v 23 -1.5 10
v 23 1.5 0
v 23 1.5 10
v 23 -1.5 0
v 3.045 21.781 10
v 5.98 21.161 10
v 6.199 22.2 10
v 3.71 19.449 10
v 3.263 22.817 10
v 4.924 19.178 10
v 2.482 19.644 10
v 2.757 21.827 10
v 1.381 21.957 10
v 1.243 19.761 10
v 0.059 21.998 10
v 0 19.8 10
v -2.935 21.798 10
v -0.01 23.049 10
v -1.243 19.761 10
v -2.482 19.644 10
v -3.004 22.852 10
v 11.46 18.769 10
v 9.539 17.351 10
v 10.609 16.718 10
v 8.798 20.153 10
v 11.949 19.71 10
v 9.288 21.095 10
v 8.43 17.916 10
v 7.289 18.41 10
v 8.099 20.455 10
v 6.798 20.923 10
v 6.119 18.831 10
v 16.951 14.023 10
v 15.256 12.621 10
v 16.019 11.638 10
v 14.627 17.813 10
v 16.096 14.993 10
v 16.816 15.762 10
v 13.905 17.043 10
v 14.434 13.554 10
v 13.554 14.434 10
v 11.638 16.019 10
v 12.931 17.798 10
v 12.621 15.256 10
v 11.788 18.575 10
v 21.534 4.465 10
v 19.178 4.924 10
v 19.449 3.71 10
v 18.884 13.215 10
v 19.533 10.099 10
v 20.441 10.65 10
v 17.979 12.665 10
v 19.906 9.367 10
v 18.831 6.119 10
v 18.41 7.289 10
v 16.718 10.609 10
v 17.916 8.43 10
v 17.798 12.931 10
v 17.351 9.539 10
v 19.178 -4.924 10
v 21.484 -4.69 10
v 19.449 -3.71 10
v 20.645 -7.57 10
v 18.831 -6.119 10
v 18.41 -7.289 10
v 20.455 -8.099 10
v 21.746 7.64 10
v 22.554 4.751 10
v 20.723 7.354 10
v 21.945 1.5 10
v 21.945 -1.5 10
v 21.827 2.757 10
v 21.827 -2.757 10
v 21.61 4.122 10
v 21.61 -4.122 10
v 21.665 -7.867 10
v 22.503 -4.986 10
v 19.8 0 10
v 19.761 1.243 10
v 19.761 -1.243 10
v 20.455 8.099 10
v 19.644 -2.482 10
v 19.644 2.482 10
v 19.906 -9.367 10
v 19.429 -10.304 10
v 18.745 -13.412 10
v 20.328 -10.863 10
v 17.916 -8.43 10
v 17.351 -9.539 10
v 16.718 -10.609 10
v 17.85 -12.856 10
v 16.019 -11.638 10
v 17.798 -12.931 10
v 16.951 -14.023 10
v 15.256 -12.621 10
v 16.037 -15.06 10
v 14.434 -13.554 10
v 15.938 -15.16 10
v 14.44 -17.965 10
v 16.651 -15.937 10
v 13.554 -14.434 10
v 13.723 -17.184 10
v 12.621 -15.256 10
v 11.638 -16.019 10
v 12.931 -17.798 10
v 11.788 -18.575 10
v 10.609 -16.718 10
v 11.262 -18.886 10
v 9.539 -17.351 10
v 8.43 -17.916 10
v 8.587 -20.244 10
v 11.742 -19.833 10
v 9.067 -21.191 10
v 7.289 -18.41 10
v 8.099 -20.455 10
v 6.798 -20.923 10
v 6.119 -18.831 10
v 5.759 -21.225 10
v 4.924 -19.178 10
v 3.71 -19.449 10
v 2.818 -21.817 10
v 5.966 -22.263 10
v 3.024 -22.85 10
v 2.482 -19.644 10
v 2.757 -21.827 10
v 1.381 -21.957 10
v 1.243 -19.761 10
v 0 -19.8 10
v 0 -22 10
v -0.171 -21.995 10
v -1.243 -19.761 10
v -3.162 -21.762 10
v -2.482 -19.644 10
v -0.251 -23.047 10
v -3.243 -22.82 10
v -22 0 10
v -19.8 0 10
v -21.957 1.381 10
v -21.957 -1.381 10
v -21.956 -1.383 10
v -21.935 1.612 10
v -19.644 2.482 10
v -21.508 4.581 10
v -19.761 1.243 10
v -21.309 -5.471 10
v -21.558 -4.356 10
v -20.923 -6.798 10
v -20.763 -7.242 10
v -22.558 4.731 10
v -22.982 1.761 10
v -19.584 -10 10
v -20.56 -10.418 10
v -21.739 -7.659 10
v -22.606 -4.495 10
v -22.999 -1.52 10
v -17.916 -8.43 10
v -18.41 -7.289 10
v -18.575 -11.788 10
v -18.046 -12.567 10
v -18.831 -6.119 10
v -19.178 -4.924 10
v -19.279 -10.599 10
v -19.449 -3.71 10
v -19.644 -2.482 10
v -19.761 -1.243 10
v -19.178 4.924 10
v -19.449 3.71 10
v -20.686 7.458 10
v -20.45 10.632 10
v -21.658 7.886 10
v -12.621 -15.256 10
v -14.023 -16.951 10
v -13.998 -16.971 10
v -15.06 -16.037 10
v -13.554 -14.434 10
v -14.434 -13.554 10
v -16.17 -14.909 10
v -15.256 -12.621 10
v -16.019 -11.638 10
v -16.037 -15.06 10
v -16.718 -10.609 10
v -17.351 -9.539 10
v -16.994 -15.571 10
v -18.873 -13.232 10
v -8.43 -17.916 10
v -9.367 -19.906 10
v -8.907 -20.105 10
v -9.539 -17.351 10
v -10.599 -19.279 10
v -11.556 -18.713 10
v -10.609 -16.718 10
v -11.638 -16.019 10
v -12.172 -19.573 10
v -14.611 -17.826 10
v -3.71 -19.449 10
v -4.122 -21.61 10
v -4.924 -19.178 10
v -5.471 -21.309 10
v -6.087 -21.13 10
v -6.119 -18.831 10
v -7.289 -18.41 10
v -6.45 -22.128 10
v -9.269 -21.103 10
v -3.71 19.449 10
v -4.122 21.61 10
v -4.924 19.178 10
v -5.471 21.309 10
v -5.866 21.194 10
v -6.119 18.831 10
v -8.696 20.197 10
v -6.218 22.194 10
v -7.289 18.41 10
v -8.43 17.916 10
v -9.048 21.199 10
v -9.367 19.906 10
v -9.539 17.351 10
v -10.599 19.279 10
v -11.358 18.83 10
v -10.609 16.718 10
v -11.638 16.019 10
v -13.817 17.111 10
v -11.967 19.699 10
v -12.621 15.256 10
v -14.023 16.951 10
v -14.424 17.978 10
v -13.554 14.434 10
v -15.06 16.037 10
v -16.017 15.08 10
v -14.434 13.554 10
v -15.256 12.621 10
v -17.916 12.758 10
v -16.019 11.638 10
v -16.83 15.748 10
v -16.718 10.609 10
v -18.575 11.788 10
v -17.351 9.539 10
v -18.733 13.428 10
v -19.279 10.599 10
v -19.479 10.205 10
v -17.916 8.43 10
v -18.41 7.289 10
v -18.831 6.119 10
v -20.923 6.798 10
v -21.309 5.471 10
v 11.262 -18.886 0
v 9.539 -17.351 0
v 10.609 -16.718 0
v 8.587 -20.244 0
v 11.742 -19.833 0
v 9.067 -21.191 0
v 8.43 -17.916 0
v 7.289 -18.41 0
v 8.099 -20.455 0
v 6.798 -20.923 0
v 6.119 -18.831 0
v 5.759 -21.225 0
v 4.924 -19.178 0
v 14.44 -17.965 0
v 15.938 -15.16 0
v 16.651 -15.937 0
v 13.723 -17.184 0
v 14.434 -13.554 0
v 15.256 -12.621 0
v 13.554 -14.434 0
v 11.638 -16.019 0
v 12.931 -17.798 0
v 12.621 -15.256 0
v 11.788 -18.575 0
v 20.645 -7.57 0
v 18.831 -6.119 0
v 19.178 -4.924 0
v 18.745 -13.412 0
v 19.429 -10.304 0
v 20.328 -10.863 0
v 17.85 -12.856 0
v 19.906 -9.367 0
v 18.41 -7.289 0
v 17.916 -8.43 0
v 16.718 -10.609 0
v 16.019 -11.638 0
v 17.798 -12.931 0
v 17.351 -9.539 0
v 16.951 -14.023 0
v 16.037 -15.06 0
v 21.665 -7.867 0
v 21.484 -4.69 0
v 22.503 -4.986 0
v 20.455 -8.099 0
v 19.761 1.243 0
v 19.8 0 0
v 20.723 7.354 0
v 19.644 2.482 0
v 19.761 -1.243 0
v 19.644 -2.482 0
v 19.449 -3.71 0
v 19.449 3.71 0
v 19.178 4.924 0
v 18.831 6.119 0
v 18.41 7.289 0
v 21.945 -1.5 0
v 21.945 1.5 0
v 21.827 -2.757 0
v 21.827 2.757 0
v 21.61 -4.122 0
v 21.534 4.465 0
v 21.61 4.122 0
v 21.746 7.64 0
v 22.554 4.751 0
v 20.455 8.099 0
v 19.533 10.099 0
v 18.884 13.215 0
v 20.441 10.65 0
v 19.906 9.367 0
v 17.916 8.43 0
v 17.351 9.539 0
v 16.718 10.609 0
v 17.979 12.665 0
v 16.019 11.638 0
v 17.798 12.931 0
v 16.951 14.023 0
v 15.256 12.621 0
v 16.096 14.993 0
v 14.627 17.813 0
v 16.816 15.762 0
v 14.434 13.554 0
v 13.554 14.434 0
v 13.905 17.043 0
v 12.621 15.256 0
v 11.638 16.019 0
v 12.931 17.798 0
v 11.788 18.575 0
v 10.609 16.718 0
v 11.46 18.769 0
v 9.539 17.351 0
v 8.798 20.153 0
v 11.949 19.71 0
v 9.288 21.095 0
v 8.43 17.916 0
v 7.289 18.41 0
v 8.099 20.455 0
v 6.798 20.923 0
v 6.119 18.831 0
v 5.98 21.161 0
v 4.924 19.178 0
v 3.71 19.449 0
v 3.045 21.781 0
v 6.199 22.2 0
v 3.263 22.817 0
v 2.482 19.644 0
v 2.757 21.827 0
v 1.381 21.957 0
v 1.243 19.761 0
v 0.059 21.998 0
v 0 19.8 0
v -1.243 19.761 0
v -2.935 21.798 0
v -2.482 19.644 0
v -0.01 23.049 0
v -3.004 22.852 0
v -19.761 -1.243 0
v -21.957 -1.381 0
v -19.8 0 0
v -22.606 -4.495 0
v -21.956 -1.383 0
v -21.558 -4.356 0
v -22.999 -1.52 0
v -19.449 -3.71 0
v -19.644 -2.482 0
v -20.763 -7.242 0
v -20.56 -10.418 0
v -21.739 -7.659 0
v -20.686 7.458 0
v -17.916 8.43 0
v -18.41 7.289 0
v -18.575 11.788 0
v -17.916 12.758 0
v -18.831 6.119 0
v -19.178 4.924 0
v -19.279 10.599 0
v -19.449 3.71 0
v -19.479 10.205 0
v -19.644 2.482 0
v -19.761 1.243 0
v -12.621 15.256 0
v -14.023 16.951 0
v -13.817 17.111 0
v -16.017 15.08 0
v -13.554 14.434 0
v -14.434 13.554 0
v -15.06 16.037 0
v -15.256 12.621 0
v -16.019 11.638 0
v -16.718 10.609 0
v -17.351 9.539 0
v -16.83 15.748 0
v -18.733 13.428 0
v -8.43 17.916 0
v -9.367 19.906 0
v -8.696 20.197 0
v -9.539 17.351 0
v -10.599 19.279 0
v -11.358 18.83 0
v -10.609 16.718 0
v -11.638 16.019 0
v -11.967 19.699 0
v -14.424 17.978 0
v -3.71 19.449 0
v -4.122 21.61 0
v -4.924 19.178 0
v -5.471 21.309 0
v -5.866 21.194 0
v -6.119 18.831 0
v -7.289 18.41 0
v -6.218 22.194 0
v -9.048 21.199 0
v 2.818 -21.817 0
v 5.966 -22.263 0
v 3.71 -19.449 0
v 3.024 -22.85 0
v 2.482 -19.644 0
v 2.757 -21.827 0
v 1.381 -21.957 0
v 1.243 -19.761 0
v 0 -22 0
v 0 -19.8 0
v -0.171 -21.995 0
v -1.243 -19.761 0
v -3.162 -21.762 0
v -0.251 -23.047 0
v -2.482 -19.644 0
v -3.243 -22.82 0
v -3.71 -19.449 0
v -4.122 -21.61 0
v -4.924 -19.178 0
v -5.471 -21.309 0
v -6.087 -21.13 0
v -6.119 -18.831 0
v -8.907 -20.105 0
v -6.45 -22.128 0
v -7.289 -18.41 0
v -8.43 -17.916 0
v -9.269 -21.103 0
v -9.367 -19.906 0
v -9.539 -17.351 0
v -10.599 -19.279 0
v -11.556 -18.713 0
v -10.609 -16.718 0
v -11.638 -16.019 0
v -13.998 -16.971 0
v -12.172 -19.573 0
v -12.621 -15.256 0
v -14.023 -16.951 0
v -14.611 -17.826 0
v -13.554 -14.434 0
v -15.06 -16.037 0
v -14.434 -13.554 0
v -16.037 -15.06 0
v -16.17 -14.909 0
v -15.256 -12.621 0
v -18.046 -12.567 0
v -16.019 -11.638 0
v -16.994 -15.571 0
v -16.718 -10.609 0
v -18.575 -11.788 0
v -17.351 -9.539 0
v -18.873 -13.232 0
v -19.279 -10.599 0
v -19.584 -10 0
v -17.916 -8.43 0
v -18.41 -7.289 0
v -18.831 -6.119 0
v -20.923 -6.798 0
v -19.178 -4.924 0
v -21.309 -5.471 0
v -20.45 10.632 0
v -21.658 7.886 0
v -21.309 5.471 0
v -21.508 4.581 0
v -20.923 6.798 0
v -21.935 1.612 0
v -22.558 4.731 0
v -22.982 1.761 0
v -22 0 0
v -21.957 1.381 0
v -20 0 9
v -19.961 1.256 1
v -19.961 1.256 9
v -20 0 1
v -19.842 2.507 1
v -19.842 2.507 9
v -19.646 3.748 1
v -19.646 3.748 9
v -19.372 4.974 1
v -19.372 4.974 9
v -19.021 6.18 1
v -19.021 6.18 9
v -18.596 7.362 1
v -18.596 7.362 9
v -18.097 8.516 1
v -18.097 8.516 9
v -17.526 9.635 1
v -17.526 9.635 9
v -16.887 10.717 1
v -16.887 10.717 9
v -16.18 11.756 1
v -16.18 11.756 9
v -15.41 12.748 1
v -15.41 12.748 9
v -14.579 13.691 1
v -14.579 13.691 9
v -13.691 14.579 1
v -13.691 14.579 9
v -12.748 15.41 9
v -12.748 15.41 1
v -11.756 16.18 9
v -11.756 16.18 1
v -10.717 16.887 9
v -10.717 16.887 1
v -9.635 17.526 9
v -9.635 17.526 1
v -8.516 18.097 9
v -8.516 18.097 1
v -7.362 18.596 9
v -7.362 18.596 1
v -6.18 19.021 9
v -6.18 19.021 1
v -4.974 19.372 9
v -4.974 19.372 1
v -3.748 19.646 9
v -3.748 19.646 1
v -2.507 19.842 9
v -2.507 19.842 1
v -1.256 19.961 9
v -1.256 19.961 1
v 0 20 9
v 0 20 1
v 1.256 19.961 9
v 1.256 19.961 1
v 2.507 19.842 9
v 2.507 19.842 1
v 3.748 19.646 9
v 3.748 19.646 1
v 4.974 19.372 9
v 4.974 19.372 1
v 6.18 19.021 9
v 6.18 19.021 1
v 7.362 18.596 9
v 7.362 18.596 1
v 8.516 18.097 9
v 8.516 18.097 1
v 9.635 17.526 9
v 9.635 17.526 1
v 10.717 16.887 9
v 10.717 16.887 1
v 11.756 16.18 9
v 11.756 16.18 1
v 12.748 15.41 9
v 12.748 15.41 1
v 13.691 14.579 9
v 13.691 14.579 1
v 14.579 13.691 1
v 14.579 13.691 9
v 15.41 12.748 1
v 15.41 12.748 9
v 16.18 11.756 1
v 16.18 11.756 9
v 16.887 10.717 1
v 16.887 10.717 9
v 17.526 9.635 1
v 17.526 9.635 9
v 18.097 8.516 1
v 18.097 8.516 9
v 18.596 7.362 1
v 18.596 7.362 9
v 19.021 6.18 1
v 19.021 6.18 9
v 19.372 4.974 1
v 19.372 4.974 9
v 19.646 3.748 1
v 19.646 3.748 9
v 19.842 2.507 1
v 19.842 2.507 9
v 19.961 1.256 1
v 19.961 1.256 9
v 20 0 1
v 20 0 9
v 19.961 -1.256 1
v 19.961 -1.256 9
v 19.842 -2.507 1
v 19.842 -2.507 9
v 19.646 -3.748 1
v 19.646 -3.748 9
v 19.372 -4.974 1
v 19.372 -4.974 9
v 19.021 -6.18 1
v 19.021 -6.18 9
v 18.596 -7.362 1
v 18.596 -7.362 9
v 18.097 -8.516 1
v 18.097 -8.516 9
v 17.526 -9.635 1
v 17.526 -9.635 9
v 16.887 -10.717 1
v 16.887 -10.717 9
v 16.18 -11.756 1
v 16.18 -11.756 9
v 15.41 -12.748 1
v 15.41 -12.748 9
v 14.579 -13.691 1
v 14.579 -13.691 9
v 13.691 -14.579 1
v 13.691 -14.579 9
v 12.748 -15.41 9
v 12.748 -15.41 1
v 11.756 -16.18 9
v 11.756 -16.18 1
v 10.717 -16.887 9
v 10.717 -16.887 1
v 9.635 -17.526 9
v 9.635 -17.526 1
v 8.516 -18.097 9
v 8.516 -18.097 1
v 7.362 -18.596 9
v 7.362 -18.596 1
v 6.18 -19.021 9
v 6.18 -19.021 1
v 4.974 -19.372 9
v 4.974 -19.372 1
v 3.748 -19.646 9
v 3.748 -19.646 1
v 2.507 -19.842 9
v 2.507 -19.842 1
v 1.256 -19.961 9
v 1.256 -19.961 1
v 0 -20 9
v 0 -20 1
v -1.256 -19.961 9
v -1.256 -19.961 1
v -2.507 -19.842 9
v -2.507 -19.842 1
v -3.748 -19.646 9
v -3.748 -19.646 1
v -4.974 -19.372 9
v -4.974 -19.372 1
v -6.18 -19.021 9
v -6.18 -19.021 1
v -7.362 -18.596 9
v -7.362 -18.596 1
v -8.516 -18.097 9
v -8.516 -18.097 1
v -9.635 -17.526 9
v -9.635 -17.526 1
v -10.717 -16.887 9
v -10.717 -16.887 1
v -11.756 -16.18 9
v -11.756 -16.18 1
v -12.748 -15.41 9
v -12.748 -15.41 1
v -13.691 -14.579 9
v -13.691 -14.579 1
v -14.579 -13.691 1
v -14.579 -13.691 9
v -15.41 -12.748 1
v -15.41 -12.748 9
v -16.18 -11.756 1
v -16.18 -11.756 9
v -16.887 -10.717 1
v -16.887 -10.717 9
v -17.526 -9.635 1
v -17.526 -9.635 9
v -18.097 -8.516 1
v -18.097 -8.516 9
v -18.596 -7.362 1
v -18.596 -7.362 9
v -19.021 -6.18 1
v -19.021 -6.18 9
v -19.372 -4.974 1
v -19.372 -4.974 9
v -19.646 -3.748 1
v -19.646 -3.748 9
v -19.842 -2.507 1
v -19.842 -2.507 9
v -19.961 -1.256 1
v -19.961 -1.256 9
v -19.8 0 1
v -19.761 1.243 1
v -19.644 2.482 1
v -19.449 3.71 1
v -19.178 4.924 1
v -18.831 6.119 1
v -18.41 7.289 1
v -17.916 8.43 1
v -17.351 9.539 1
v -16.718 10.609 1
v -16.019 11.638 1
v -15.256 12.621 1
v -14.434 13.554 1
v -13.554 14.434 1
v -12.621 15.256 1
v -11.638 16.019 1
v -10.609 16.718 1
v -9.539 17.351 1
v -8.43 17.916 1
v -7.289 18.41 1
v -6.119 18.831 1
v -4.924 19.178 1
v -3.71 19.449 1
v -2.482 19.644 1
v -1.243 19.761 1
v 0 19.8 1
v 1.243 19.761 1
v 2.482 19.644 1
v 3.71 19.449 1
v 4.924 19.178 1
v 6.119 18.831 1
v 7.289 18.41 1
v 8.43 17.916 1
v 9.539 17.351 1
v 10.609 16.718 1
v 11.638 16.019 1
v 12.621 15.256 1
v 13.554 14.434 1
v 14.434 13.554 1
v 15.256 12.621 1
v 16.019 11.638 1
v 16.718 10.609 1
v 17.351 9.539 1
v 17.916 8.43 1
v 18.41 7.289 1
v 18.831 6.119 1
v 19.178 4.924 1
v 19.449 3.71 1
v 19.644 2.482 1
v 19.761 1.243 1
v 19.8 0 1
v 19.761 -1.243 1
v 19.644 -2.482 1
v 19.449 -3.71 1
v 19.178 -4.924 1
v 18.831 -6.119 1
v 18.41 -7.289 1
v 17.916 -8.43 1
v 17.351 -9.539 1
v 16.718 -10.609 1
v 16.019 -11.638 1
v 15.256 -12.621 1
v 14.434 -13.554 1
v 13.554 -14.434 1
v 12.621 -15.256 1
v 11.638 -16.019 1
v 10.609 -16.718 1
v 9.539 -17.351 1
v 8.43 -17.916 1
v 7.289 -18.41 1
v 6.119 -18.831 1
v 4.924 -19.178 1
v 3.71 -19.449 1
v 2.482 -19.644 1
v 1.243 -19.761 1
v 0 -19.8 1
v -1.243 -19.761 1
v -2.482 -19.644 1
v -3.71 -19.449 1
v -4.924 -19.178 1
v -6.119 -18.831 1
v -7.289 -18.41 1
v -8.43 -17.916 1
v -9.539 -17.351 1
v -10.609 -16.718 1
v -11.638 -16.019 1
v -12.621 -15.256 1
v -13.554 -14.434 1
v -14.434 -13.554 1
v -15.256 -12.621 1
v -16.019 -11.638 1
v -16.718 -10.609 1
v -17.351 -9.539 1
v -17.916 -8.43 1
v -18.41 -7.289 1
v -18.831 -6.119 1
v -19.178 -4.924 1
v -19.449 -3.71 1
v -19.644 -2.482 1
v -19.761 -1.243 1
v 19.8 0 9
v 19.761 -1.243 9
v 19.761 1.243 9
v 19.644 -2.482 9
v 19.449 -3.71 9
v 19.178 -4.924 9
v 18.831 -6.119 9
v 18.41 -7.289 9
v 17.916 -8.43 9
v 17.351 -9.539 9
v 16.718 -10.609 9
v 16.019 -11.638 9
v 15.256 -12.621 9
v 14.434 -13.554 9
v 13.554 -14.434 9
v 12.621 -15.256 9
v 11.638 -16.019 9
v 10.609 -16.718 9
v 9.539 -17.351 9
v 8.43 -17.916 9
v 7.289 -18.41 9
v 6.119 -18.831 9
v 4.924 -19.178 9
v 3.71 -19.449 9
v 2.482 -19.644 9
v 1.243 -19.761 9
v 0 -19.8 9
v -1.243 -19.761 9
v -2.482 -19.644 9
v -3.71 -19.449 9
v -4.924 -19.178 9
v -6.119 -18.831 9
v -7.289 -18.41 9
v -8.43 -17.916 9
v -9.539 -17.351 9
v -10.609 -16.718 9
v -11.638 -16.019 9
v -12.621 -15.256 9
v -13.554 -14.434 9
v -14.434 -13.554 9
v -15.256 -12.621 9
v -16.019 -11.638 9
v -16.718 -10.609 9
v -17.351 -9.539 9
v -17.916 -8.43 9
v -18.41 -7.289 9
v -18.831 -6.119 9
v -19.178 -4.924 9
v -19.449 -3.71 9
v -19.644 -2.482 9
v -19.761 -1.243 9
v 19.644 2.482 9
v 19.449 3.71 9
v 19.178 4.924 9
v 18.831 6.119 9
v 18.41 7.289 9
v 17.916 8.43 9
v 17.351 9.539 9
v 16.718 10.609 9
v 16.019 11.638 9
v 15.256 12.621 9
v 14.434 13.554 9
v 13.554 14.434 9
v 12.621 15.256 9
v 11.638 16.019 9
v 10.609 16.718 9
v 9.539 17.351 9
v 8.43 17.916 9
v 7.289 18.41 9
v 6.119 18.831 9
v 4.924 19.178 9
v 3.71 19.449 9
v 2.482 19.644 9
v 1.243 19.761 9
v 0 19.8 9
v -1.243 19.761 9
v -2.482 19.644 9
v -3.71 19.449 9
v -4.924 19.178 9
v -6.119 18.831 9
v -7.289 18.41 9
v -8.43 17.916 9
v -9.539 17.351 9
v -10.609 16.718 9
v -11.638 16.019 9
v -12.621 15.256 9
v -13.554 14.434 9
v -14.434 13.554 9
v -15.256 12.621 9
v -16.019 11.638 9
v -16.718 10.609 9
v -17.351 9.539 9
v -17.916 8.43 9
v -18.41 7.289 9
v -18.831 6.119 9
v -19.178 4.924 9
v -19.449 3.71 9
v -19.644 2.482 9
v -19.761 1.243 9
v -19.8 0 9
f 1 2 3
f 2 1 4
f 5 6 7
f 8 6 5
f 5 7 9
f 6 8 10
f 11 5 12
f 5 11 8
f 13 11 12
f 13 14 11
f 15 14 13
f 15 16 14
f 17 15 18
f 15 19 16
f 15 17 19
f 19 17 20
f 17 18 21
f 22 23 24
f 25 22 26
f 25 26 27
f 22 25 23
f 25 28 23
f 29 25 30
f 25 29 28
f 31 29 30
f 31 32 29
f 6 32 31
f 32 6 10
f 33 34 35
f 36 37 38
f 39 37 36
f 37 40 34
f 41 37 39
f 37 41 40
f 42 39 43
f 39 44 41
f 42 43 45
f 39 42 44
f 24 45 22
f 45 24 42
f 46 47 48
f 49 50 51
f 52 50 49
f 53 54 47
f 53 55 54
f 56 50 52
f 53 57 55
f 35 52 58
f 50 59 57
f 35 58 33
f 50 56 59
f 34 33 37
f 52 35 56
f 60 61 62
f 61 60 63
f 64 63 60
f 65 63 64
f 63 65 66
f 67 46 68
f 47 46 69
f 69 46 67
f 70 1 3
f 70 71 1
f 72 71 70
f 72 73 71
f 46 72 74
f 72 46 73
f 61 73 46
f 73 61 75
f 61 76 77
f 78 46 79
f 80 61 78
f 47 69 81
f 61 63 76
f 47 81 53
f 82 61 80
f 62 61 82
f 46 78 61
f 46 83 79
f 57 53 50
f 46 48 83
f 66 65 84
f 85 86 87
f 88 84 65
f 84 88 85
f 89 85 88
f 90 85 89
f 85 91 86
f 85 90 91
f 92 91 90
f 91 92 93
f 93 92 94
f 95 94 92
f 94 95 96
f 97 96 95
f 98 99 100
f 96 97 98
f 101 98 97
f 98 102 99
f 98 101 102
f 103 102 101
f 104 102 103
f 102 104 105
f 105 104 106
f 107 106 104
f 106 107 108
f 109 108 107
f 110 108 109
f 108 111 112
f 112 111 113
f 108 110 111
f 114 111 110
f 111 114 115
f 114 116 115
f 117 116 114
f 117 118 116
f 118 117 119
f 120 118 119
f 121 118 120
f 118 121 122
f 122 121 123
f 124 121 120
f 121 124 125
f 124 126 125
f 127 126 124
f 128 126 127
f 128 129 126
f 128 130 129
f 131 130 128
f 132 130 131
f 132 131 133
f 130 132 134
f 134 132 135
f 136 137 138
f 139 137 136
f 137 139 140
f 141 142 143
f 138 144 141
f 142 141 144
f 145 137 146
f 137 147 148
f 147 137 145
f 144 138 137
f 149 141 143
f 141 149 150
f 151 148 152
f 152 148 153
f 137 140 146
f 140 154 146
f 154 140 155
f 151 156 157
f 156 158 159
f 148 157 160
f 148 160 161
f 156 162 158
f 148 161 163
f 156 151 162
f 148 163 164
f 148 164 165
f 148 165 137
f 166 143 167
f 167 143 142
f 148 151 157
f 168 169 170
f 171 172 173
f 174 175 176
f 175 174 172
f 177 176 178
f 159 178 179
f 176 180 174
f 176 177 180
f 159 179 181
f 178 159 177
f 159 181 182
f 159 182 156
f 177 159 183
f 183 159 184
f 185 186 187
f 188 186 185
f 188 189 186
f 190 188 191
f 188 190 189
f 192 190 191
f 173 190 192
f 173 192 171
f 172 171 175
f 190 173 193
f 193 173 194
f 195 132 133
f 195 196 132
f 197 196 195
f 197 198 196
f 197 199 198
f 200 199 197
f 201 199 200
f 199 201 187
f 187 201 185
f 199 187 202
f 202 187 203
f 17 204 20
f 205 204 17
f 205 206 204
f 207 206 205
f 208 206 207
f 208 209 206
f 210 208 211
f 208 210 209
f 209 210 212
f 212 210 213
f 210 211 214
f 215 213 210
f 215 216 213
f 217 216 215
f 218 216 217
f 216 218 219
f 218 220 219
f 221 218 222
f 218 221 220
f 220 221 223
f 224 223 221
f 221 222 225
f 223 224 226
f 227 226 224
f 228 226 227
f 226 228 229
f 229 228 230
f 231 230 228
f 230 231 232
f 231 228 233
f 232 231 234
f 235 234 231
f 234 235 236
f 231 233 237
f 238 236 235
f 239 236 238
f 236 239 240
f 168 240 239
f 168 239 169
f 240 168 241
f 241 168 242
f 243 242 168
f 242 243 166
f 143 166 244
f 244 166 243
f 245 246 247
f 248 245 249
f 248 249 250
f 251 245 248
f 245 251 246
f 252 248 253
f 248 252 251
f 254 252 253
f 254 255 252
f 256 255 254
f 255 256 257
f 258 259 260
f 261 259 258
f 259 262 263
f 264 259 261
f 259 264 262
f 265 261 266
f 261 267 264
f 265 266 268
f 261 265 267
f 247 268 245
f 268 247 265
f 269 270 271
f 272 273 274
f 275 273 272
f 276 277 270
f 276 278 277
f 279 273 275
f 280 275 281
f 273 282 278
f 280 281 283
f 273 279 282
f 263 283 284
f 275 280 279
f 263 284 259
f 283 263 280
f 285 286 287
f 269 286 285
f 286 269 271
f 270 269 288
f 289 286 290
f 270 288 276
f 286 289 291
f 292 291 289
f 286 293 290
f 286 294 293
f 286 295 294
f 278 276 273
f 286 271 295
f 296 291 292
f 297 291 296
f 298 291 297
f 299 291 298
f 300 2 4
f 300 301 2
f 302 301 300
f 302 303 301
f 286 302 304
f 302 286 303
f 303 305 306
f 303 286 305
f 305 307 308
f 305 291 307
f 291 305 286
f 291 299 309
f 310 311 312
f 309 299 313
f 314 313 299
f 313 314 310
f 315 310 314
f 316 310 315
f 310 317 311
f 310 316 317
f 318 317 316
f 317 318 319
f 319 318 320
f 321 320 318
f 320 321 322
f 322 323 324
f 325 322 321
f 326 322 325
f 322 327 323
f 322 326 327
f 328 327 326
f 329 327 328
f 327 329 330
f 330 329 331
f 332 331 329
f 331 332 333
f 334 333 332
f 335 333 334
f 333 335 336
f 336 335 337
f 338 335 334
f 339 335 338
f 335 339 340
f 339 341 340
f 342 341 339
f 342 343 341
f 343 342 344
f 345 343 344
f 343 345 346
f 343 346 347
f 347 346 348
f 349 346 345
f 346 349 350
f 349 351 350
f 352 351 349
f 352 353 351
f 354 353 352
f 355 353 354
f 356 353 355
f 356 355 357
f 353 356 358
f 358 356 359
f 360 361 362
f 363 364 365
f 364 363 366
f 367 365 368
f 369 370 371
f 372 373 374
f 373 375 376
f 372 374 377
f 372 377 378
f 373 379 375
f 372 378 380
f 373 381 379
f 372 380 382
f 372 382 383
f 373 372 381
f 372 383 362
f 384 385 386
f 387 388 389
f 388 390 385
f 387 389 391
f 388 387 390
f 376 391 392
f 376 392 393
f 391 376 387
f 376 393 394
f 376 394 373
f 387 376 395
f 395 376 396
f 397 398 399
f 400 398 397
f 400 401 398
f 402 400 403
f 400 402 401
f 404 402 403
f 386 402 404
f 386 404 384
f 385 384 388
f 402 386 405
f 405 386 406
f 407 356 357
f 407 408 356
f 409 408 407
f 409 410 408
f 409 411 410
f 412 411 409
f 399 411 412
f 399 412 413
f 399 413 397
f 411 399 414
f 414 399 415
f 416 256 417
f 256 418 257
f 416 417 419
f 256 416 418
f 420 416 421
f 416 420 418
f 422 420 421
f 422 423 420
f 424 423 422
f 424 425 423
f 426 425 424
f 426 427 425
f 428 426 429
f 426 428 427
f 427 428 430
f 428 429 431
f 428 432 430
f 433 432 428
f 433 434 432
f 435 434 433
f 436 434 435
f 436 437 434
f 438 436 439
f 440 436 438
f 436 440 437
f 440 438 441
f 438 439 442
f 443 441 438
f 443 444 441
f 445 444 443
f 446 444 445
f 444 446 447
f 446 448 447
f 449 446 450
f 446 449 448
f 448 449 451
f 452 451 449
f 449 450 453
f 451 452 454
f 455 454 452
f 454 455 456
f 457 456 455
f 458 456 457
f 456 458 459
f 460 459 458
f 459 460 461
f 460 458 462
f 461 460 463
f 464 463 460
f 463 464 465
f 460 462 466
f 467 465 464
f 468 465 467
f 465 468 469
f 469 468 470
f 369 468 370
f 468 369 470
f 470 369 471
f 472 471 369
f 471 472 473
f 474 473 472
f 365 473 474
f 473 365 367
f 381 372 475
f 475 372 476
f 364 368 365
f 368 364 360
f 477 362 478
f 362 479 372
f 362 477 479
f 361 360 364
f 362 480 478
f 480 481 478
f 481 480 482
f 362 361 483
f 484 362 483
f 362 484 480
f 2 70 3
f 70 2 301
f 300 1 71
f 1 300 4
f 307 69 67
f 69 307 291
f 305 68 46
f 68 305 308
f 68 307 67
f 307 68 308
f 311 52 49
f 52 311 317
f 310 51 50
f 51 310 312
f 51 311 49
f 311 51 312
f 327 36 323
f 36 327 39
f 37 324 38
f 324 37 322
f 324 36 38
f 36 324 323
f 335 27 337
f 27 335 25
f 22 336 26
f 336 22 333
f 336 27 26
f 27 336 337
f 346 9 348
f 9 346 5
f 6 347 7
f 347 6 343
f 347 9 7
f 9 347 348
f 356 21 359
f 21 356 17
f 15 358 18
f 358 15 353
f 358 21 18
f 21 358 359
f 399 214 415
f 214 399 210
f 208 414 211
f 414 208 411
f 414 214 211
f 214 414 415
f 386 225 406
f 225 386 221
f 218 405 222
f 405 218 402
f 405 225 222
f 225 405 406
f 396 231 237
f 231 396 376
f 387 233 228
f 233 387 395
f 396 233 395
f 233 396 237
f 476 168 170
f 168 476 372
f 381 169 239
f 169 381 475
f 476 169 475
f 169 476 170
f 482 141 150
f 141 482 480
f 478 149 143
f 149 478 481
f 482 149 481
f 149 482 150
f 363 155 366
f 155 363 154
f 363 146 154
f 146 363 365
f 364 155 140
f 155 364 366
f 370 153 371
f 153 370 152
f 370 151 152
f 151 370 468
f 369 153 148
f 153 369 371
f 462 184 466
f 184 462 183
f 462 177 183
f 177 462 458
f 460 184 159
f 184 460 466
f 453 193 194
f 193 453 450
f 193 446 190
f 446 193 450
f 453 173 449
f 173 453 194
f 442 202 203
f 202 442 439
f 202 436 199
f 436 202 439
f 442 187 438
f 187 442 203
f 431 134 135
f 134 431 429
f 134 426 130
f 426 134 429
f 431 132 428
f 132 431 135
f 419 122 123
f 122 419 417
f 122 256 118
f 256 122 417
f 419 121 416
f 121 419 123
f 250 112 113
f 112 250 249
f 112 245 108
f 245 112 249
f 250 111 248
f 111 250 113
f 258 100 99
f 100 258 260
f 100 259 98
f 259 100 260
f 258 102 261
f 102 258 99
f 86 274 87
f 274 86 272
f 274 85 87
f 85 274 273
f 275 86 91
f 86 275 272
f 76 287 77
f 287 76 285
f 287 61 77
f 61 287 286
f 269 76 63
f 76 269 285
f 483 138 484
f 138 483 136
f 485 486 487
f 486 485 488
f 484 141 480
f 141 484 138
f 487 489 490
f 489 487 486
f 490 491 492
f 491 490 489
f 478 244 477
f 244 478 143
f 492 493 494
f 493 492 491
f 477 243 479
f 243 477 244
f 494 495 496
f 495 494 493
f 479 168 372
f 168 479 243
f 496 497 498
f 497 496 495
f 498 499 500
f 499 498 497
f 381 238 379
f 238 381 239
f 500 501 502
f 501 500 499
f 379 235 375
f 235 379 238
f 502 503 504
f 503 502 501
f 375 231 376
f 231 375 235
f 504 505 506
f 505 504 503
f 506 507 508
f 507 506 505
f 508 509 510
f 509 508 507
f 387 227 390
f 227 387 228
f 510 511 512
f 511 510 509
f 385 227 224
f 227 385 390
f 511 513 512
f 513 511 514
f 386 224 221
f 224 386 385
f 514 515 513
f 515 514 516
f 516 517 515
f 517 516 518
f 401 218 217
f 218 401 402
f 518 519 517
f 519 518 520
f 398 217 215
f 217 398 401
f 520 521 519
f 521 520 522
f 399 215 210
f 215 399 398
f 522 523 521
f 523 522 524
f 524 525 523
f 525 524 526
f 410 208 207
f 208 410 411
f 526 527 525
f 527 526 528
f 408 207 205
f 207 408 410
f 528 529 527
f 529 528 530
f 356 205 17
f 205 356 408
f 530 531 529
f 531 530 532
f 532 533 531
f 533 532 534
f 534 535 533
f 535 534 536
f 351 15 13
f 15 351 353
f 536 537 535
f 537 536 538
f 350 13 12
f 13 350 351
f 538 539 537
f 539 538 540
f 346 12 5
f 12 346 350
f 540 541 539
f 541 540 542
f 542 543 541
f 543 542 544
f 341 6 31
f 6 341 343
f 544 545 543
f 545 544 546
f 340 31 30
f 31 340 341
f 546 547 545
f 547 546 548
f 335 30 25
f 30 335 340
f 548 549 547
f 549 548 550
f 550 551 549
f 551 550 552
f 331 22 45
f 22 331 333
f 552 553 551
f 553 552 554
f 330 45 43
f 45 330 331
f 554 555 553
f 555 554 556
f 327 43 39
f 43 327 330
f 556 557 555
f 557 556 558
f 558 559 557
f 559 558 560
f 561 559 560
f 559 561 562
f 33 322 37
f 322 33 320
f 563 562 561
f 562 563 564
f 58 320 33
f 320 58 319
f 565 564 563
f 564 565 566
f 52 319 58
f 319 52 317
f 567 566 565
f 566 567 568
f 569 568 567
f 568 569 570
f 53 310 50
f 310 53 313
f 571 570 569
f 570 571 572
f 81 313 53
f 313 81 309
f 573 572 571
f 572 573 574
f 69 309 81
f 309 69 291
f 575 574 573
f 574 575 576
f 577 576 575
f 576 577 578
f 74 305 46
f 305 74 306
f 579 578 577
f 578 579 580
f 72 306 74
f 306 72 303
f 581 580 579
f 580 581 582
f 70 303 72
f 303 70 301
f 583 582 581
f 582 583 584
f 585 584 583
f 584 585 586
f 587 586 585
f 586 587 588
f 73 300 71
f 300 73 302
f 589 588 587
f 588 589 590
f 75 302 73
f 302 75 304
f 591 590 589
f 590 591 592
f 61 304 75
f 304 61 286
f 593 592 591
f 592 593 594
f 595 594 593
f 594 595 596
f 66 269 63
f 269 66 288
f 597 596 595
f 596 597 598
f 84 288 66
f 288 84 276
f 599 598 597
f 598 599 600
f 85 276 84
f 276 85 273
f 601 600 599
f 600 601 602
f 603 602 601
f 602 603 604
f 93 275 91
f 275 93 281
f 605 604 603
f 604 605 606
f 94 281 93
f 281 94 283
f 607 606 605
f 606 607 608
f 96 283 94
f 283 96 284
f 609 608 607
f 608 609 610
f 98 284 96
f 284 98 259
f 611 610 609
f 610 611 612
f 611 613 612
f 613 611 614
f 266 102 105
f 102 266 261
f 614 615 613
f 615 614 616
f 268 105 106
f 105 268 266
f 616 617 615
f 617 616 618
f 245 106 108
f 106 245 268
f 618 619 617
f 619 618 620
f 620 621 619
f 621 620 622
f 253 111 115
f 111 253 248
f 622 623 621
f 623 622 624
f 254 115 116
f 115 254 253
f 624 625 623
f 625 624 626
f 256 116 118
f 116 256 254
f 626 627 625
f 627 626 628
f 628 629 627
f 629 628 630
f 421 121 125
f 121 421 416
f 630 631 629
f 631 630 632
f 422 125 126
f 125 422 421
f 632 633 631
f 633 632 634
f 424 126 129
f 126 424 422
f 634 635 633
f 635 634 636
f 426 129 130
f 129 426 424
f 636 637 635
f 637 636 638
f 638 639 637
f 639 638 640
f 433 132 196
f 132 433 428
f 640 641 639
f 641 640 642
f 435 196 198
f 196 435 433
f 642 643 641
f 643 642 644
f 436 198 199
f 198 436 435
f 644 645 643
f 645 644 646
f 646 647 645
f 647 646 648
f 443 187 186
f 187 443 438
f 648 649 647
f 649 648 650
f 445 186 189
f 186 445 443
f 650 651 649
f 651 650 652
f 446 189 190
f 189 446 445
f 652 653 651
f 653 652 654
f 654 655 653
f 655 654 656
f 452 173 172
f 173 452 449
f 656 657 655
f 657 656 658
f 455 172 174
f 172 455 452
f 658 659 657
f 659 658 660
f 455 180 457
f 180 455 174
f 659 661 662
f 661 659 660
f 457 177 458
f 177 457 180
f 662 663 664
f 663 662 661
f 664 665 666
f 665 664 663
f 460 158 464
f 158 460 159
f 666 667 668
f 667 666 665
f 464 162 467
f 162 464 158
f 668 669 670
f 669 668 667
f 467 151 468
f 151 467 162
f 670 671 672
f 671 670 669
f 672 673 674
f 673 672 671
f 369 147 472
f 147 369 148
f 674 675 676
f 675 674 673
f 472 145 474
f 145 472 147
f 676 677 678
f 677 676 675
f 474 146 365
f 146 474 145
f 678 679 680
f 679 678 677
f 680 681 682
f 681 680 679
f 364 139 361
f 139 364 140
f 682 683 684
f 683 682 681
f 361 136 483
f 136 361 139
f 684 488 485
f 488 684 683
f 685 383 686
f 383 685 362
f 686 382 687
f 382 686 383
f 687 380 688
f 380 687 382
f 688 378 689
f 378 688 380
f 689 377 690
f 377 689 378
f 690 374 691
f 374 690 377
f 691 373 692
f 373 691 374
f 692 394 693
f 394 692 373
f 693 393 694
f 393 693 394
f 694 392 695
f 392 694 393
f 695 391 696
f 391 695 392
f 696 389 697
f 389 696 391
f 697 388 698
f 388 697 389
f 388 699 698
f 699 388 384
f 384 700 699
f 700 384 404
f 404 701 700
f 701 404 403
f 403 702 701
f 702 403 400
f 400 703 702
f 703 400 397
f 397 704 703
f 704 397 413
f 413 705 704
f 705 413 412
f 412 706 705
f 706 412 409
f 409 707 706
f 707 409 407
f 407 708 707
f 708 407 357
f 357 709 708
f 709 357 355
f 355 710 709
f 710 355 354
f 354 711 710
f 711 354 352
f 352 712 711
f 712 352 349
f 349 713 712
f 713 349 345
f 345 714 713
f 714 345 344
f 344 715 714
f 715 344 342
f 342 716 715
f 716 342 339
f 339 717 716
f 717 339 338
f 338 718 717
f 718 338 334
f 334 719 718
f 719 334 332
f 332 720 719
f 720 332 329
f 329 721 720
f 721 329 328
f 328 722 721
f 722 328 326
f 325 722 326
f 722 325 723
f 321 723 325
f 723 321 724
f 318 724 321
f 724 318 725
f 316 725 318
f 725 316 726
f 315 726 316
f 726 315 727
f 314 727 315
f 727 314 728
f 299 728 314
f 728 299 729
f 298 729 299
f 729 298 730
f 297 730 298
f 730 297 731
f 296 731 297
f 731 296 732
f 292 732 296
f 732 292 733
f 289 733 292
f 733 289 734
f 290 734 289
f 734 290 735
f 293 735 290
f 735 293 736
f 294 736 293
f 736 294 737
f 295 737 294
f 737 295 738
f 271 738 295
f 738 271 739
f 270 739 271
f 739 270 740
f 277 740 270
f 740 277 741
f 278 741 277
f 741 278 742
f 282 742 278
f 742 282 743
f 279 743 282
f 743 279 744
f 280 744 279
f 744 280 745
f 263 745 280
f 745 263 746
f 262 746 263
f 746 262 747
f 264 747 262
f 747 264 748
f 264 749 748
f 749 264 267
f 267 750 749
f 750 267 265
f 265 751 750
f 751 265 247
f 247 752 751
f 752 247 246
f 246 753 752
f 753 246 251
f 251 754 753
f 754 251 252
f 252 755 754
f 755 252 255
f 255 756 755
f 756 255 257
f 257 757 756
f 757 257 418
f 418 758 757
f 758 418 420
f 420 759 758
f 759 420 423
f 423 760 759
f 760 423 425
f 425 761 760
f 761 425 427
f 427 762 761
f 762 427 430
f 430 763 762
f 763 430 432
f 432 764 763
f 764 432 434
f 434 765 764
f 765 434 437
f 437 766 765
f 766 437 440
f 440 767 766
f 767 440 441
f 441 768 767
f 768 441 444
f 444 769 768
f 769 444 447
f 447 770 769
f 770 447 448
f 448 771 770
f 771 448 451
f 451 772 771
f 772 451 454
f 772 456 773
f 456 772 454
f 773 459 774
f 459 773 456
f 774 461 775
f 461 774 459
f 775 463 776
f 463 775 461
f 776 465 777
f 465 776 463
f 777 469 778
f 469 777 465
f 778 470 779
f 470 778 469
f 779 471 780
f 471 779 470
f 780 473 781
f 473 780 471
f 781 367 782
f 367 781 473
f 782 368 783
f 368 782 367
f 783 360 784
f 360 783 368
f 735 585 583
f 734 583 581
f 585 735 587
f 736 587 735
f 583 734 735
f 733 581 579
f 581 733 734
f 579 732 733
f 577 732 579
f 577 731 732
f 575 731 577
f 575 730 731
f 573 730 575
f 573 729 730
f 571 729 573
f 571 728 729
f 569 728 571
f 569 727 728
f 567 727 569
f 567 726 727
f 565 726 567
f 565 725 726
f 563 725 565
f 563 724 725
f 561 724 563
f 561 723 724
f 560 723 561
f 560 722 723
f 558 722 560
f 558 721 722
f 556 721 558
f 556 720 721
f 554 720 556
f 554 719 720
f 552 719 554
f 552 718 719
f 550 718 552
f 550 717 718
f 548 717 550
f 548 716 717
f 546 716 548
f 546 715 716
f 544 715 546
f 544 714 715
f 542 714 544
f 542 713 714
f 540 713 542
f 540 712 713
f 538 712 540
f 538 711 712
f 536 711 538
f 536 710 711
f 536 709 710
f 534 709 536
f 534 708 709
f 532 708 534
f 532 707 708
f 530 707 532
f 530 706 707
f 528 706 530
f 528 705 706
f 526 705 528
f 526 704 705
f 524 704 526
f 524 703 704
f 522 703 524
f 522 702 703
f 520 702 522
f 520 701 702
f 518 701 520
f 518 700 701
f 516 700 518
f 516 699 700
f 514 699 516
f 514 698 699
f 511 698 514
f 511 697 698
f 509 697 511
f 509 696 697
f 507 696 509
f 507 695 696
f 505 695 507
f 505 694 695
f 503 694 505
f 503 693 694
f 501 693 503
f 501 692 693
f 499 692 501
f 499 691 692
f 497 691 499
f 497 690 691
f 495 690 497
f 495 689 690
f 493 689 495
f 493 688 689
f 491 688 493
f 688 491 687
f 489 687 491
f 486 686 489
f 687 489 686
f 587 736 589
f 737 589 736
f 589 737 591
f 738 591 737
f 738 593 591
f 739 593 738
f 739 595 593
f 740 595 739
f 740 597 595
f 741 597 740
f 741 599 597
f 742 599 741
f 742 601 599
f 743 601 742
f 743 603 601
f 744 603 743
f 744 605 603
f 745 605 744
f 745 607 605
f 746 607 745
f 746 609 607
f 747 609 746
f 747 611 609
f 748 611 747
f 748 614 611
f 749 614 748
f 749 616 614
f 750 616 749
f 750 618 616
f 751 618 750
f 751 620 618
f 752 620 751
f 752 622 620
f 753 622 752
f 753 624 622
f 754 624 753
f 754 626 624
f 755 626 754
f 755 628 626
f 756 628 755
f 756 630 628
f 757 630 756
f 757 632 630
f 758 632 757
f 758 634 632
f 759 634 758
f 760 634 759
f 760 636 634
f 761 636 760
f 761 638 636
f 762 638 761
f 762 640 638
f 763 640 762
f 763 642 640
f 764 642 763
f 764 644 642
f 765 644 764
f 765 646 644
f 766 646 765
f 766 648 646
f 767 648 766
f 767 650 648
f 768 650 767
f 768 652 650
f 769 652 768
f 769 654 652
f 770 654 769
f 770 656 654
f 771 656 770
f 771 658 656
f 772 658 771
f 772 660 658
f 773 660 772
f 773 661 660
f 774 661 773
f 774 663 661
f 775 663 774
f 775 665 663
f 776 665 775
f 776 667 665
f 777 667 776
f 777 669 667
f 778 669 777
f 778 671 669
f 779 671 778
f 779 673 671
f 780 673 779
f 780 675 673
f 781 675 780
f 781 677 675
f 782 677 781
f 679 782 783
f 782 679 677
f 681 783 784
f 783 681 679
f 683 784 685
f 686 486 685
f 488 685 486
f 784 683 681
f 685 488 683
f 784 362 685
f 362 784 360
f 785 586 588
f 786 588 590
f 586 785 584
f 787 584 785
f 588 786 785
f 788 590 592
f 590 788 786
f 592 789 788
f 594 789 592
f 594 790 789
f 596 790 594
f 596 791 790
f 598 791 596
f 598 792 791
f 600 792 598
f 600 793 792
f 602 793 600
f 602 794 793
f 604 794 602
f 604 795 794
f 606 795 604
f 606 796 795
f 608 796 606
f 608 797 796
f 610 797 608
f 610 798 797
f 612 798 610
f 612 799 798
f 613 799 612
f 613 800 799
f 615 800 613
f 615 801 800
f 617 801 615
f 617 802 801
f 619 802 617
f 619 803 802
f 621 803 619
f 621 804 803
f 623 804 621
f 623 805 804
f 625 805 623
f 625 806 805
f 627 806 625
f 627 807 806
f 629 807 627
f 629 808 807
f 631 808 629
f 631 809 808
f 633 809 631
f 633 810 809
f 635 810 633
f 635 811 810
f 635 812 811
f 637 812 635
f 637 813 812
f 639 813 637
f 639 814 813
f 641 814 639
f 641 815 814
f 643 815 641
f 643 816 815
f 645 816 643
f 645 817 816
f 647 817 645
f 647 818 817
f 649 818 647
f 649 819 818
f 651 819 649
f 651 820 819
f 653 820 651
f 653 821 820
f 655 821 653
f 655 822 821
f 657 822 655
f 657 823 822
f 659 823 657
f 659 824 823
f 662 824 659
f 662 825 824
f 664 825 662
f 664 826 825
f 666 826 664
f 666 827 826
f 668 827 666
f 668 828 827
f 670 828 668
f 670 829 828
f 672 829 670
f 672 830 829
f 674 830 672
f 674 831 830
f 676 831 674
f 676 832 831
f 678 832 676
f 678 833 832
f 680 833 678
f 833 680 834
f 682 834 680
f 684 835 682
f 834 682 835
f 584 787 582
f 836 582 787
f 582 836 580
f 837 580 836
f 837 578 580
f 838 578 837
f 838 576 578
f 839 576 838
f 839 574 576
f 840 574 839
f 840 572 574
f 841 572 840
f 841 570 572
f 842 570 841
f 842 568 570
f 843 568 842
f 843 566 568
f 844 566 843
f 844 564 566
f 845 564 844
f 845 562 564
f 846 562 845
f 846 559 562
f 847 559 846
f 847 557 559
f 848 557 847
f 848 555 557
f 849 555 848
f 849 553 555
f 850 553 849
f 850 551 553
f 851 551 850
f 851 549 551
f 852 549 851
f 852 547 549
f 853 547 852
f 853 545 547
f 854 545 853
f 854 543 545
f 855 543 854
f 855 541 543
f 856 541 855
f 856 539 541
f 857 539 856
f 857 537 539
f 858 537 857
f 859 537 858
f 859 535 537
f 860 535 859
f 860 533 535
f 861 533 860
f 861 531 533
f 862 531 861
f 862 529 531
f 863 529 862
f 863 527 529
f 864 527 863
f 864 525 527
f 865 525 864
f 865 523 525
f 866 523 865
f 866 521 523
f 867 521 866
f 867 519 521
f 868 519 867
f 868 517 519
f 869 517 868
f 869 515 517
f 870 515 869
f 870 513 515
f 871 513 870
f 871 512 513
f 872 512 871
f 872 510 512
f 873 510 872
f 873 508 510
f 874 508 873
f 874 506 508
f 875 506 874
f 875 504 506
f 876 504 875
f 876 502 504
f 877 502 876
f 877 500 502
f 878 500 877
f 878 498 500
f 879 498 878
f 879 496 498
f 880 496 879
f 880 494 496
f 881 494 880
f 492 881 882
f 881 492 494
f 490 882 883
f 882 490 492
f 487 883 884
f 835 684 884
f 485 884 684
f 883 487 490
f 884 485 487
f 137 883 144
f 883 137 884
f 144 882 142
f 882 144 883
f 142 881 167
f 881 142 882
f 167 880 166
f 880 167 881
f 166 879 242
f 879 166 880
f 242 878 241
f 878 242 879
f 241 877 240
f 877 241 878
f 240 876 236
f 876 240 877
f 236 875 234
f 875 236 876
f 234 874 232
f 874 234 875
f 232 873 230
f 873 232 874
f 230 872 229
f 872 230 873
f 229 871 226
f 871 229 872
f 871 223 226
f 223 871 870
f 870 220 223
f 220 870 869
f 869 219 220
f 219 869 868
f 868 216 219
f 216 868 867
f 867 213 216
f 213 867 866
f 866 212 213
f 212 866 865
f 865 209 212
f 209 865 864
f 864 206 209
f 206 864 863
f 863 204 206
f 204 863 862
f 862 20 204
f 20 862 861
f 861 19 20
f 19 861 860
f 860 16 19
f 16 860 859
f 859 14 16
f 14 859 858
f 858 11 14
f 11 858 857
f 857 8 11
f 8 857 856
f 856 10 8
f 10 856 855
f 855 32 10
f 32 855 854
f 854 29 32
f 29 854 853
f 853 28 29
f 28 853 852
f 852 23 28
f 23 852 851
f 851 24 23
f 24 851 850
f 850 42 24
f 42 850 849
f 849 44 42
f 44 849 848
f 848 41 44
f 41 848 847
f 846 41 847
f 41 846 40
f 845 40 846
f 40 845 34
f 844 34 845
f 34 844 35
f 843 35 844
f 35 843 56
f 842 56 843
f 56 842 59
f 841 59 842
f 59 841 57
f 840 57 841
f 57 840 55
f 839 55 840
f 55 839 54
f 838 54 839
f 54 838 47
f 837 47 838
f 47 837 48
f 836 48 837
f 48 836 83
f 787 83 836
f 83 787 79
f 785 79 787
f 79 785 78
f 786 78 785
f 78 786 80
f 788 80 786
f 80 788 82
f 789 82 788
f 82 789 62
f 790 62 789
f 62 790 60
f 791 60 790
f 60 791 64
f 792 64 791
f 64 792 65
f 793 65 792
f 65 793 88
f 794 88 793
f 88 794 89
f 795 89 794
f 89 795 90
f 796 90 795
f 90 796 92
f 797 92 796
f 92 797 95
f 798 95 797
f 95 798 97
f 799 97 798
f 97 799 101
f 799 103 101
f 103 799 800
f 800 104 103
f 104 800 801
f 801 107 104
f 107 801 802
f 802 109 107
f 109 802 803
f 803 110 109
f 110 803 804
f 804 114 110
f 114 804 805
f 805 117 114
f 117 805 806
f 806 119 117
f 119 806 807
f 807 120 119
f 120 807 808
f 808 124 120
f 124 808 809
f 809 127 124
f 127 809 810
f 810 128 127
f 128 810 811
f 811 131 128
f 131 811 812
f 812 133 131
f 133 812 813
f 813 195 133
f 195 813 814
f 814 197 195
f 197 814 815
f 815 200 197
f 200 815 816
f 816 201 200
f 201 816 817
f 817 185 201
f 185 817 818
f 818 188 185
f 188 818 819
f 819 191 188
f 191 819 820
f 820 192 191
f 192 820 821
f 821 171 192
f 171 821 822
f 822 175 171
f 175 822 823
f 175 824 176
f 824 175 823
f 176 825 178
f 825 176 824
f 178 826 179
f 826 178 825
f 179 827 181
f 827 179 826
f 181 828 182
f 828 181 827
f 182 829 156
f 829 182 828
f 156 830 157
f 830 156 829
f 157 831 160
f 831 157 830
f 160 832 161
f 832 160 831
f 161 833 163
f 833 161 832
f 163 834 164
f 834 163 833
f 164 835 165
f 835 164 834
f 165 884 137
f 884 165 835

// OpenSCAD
$fn=100;
k = 22 * PI /3;
ki = 360/k;
rotate_extrude() translate([20,0]) square([2,10]);
rotate_extrude() translate([19.8,0]) square([2,1]);
translate([0,0,9]) rotate_extrude() translate([19.8,0]) square([2,1]);

for(i=[0:1:k-1]) rotate([0,0,ki*i]) translate([22,0,5]) cube([2,3,10],center=true);
